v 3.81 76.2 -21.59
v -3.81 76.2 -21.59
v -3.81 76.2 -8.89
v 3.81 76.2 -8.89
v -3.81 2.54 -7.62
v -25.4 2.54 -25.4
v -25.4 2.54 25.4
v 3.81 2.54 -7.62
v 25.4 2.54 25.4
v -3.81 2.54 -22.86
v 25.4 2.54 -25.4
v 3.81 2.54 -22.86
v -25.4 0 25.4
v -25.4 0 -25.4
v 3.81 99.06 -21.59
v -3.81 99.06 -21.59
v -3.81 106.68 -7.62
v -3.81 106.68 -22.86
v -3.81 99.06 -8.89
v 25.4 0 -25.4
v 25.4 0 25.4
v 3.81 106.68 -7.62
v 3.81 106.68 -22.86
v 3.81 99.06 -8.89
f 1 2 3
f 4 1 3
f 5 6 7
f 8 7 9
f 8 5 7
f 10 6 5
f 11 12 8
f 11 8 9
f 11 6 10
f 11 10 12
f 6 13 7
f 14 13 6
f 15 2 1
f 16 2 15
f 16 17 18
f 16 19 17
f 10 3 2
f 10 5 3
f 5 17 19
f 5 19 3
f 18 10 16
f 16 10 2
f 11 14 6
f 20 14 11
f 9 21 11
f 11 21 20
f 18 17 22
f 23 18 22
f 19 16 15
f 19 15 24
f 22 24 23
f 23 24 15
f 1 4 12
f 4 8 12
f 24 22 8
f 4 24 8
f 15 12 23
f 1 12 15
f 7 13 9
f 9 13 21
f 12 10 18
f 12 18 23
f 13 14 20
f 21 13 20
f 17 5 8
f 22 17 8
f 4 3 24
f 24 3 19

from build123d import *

# Parameters (mm, degrees)
SKETCH1_W           = 50.8
SKETCH1_H           = 50.8
BOSS_EXTRUDE1_DEPTH = 2.54
SKETCH2_W           = 7.62
SKETCH2_H           = 15.24
BOSS_EXTRUDE2_DEPTH = 104.14
SKETCH3_W           = 12.7
SKETCH3_H           = 22.86
CUT_EXTRUDE1_DEPTH  = 114.485710554


with BuildPart() as part:
    # Sketch1 → Boss-Extrude1 (new body)
    with BuildSketch(Plane(origin=(0, 0, 0), x_dir=(1, 0, 0), z_dir=(0, 1, 0))):
        Rectangle(SKETCH1_W, SKETCH1_H)
    extrude(amount=BOSS_EXTRUDE1_DEPTH)

    # Sketch2 → Boss-Extrude2 (add)
    with BuildSketch(Plane(origin=(0, 2.54, 0), x_dir=(1, 0, 0), z_dir=(0, 1, 0))):
        with Locations((0, 15.24)):
            Rectangle(SKETCH2_W, SKETCH2_H)
    extrude(amount=BOSS_EXTRUDE2_DEPTH)

    # Sketch3 → Cut-Extrude1 (cut, through all)
    with BuildSketch(Plane.ZY.offset(3.81)):
        with Locations((-15.24, 87.63)):
            Rectangle(SKETCH3_W, SKETCH3_H)
    extrude(amount=-CUT_EXTRUDE1_DEPTH, mode=Mode.SUBTRACT)


solid = part.part
